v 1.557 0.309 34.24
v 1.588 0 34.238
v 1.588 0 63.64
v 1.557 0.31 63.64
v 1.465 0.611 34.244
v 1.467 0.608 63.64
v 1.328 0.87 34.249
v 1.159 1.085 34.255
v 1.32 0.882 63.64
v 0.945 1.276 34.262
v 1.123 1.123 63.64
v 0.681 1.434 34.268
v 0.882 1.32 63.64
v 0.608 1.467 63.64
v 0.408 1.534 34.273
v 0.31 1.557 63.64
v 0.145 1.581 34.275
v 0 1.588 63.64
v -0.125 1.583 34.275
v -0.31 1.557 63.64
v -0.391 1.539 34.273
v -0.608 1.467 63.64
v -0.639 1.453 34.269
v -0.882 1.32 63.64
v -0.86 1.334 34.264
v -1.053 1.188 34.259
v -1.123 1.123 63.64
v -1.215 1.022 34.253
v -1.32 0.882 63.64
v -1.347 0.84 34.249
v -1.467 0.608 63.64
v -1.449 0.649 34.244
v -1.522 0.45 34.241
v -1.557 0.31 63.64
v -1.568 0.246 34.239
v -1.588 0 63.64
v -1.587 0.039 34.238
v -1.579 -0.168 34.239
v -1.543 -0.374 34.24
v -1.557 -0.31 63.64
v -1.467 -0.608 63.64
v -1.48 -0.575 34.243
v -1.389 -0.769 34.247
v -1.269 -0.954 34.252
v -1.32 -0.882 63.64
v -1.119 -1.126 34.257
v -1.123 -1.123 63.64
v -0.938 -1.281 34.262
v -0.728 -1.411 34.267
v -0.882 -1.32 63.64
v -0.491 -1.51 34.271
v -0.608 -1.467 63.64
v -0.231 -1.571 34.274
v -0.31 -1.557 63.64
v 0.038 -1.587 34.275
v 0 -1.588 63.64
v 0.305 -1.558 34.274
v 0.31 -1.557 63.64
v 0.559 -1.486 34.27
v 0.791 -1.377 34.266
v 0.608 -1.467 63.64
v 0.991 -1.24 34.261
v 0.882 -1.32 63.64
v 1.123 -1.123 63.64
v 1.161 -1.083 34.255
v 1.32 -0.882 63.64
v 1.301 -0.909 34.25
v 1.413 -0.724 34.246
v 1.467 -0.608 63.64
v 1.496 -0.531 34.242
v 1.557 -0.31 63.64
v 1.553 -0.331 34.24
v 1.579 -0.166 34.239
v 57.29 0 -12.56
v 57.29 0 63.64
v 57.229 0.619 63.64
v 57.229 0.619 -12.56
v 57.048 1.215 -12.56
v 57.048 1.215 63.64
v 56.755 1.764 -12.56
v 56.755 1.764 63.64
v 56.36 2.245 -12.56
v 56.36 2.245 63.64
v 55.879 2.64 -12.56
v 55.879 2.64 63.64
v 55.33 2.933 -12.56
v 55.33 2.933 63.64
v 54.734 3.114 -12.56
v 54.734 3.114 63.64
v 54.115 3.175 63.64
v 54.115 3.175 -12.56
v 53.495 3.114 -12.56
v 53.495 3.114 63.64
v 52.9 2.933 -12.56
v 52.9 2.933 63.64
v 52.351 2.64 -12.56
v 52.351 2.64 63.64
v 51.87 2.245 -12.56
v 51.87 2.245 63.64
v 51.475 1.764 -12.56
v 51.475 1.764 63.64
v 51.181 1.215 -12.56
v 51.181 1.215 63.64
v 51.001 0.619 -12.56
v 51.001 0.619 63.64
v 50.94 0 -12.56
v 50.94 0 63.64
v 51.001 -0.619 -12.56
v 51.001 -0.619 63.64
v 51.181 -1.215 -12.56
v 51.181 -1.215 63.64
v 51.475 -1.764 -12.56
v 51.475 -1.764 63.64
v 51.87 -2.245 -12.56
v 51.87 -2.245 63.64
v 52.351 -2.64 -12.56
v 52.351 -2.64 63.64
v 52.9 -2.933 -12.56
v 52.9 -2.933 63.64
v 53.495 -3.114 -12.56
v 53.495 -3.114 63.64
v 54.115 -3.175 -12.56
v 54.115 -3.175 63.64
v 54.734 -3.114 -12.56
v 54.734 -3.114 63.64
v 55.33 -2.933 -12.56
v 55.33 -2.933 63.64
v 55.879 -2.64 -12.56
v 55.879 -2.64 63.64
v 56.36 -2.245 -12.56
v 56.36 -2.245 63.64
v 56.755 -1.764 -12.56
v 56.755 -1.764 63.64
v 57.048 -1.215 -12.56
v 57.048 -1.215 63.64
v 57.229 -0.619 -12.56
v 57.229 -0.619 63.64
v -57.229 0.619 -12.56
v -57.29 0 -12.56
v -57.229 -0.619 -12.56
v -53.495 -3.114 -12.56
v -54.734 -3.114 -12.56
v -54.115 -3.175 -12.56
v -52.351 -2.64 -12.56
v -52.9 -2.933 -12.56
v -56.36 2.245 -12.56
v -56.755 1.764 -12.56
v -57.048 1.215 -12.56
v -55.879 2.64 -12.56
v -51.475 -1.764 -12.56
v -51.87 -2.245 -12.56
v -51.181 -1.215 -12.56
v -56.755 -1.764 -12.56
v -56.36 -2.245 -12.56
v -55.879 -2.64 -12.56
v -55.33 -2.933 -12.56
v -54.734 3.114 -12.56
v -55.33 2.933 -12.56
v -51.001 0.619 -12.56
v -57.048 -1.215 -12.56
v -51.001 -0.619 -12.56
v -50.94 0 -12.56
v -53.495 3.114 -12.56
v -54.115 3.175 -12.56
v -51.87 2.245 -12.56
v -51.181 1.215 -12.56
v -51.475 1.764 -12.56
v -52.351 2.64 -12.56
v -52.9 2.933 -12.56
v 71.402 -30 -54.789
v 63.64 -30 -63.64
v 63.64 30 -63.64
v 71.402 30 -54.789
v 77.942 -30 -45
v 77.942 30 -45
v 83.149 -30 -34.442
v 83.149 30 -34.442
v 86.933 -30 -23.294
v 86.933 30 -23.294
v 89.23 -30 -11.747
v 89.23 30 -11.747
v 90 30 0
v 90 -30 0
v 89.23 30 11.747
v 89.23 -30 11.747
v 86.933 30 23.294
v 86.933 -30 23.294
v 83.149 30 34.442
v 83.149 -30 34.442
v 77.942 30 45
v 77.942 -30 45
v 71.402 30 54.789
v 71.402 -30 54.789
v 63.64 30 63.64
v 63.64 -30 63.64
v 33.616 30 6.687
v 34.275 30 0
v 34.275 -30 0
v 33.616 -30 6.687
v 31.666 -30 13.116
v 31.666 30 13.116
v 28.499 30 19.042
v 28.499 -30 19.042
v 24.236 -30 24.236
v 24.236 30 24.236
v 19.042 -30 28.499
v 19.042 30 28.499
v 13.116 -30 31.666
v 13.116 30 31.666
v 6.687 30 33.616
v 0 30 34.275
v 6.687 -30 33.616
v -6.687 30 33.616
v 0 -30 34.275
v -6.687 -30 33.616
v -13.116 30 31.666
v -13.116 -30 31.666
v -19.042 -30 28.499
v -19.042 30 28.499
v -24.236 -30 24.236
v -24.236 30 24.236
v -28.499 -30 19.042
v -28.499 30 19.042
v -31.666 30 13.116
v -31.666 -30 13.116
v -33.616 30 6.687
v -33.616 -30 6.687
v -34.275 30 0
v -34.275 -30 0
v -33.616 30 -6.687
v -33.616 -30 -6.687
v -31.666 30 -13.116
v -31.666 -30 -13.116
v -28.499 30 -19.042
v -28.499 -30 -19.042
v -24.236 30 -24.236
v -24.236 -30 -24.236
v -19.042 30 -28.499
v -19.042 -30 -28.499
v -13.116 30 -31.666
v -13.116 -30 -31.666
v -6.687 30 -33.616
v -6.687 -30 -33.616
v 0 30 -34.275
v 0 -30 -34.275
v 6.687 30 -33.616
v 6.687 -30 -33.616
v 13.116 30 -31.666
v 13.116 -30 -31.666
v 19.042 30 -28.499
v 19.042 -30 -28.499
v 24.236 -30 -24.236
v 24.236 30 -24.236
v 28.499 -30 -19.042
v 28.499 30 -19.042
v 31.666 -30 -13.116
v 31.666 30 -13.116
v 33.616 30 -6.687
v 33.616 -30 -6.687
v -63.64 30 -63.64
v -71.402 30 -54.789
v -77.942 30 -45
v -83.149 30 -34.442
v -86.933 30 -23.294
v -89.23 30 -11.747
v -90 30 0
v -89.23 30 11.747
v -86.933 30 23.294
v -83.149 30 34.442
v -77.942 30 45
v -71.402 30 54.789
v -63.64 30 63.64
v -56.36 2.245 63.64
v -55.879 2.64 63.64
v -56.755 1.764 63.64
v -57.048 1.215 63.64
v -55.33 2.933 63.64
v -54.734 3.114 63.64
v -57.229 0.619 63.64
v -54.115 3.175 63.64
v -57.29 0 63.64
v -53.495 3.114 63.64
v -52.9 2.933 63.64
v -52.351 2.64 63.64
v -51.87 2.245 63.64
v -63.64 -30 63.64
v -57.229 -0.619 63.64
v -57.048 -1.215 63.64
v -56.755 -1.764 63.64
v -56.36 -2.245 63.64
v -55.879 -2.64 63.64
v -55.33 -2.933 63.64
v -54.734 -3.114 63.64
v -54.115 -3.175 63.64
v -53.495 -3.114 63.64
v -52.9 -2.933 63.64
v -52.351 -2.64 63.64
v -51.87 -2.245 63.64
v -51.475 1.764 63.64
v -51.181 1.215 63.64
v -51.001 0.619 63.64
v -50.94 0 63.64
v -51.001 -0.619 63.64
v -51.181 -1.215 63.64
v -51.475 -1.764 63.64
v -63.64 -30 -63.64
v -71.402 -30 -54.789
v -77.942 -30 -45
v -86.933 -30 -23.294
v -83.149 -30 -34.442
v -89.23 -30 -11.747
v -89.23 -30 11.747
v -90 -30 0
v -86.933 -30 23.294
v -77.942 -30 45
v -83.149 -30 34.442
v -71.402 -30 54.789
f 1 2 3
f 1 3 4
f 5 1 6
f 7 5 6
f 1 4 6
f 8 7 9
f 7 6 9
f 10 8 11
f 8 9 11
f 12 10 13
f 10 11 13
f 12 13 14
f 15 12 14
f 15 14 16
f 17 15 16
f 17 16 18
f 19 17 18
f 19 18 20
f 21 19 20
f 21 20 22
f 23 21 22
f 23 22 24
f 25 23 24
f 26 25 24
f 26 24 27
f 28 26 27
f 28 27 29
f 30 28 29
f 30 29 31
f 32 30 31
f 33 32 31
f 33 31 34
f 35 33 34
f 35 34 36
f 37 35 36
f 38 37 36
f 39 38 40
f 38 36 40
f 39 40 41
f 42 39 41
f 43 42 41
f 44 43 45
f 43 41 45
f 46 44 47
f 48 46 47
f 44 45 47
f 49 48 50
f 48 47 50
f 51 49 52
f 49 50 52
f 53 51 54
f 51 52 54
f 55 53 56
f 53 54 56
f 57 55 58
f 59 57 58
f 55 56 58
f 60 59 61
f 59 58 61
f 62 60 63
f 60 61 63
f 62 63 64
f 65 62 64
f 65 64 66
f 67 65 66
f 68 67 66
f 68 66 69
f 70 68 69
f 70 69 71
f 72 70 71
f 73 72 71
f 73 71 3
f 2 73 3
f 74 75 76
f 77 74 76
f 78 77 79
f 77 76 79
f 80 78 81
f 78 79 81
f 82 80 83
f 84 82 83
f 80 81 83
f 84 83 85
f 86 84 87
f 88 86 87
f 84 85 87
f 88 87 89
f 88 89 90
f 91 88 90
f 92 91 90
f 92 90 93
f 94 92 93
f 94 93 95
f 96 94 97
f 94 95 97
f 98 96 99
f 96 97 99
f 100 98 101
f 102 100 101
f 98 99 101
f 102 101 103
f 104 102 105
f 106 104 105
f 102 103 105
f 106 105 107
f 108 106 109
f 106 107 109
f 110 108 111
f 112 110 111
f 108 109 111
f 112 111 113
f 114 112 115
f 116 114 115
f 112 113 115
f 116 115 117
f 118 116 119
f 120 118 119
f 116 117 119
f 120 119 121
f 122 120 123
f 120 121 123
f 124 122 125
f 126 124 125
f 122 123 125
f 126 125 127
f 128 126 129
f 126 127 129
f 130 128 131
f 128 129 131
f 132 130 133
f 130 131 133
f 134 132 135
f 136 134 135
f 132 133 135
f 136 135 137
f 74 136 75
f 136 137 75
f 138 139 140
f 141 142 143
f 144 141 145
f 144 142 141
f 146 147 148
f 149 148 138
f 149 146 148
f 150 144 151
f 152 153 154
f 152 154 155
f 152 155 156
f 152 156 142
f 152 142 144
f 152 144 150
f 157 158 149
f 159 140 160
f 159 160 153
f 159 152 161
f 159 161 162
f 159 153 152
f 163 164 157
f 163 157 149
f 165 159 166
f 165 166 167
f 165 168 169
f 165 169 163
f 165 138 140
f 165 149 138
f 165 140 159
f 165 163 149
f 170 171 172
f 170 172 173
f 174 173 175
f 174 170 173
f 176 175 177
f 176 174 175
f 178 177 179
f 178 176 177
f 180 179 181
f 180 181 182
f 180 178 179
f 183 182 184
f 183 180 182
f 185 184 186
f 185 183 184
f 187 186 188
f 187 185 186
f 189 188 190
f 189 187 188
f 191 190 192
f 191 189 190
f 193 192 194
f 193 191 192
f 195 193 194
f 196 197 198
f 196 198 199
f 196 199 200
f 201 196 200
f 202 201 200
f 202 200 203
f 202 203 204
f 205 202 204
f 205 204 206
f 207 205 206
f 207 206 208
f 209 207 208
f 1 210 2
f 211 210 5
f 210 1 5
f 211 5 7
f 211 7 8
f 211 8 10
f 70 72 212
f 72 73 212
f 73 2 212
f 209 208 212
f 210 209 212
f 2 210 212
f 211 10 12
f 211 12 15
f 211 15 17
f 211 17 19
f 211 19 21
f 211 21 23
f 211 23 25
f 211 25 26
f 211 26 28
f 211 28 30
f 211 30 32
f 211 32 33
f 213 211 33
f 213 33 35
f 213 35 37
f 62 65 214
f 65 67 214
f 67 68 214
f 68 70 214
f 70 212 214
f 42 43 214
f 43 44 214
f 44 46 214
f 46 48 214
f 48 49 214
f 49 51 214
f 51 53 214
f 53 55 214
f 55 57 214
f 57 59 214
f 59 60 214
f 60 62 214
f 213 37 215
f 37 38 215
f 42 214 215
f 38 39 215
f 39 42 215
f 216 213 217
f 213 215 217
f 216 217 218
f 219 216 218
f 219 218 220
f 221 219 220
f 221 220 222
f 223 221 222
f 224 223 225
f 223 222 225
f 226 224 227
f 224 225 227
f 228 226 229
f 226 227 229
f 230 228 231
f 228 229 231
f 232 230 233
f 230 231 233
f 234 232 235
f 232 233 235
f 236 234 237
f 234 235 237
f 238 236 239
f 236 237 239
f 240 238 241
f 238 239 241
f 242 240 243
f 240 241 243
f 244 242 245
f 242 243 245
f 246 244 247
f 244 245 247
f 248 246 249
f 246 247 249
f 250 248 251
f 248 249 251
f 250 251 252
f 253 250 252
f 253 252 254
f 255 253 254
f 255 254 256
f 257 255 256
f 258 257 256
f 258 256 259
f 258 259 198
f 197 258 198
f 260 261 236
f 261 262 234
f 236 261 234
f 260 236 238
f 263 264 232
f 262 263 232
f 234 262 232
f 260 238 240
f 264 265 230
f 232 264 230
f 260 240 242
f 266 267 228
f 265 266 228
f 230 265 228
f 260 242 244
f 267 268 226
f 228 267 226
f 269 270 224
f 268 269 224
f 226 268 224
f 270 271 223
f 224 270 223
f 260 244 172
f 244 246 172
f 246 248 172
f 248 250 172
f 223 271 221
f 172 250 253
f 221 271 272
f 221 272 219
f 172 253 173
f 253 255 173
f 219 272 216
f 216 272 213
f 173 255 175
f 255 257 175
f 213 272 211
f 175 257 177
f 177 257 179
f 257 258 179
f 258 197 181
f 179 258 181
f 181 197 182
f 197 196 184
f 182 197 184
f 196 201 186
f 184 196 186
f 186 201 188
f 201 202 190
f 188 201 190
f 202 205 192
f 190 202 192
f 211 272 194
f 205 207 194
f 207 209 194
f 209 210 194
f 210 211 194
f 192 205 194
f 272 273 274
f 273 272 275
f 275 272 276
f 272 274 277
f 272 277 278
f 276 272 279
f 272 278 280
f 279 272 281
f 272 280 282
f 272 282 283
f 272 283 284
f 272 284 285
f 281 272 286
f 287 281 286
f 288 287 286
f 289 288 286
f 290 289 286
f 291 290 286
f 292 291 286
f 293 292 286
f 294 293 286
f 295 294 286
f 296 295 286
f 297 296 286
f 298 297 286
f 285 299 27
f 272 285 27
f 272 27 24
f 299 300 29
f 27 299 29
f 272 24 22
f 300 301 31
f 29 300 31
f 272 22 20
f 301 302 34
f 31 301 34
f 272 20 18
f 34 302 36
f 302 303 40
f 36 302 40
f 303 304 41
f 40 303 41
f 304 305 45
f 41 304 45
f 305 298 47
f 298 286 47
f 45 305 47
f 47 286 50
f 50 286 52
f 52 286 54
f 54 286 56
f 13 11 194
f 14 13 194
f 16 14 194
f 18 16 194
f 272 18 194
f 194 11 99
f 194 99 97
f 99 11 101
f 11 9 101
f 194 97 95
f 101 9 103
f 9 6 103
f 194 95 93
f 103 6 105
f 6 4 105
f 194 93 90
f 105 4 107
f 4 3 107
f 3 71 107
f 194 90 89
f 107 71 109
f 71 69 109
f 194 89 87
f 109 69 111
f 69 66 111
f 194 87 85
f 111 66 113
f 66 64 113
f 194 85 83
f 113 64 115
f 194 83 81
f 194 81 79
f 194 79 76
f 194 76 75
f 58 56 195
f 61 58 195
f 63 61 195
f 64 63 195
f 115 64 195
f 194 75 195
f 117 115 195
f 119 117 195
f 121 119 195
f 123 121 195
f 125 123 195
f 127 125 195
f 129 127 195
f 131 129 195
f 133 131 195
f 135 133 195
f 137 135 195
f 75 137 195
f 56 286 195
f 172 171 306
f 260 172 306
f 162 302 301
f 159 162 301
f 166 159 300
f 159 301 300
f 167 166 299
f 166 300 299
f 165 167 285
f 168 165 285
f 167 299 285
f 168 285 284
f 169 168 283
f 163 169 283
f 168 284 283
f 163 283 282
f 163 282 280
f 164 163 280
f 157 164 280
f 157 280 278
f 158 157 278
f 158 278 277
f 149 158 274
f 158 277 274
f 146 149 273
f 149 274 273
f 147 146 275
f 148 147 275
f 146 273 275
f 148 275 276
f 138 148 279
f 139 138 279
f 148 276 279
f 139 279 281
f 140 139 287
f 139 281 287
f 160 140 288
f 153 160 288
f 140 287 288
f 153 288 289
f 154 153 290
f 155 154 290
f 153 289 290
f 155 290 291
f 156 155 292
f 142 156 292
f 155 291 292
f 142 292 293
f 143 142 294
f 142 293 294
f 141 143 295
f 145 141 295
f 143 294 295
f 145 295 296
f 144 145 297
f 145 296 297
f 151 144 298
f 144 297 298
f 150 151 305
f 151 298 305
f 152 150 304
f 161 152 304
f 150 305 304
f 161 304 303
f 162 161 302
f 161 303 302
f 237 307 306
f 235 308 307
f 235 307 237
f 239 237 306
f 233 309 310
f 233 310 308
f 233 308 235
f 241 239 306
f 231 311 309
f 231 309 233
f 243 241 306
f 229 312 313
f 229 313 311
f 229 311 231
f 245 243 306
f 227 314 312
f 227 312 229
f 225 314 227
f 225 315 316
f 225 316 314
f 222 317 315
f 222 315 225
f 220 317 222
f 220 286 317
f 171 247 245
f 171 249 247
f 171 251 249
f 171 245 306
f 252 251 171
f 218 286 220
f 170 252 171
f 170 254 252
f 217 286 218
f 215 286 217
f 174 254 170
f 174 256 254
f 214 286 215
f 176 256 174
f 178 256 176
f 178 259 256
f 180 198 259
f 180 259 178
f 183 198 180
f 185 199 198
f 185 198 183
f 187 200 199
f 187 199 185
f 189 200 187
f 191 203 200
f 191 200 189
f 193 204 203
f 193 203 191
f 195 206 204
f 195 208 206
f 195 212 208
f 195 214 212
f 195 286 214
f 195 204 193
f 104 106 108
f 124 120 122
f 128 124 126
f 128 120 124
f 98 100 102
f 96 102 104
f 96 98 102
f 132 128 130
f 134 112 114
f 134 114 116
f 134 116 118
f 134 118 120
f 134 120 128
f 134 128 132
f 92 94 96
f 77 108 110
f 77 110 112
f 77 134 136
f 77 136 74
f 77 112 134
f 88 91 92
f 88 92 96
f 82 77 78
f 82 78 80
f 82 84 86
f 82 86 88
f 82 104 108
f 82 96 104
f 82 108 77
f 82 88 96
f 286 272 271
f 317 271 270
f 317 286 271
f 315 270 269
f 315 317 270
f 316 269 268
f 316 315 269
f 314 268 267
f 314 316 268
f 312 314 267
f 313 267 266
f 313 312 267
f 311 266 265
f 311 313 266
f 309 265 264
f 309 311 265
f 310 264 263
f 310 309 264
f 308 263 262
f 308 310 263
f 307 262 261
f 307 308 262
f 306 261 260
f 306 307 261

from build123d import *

# Parameters (mm, degrees)
F0_R     = 90
F1_DEPTH = 30
F3_DEPTH = 60.001
F4_R     = 34.275
F5_DEPTH = 60.001
F6_R     = 3.175
F6_R_2   = 1.5875
F7_DEPTH = 76.2


with BuildPart() as f1:
    # F0 (on Front) → F1 (new body, symmetric)
    with BuildSketch(Plane.XZ):
        Circle(F0_R)
    extrude(amount=F1_DEPTH, both=True)

    # F2 (on face) → F3 (cut, through all)
    with BuildSketch(Plane.XZ.offset(30)):
        with BuildLine():
            ThreePointArc((-63.6396103068, -63.6396103068), (0, -90), (63.6396103068, -63.6396103068))
            Line((63.6396103068, -63.6396103068), (-63.6396103068, -63.6396103068))
        make_face()
        with BuildLine():
            Line((-63.6396103068, 63.6396103068), (63.6396103068, 63.6396103068))
            ThreePointArc((63.6396103068, 63.6396103068), (0, 90), (-63.6396103068, 63.6396103068))
        make_face()
    extrude(amount=-F3_DEPTH, mode=Mode.SUBTRACT)

    # F4 (on face) → F5 (cut, through all)
    with BuildSketch(Plane.XZ.offset(30)):
        Circle(F4_R)
    extrude(amount=-F5_DEPTH, mode=Mode.SUBTRACT)

    # F6 (on face) → F7 (cut)
    with BuildSketch(Plane.XY.offset(63.6396103068)):
        with Locations((-54.1146103068, 0)):
            Circle(F6_R)
        Circle(F6_R_2)
        with Locations((54.1146103068, 0)):
            Circle(F6_R)
    extrude(amount=-F7_DEPTH, mode=Mode.SUBTRACT)


solid = f1.part
